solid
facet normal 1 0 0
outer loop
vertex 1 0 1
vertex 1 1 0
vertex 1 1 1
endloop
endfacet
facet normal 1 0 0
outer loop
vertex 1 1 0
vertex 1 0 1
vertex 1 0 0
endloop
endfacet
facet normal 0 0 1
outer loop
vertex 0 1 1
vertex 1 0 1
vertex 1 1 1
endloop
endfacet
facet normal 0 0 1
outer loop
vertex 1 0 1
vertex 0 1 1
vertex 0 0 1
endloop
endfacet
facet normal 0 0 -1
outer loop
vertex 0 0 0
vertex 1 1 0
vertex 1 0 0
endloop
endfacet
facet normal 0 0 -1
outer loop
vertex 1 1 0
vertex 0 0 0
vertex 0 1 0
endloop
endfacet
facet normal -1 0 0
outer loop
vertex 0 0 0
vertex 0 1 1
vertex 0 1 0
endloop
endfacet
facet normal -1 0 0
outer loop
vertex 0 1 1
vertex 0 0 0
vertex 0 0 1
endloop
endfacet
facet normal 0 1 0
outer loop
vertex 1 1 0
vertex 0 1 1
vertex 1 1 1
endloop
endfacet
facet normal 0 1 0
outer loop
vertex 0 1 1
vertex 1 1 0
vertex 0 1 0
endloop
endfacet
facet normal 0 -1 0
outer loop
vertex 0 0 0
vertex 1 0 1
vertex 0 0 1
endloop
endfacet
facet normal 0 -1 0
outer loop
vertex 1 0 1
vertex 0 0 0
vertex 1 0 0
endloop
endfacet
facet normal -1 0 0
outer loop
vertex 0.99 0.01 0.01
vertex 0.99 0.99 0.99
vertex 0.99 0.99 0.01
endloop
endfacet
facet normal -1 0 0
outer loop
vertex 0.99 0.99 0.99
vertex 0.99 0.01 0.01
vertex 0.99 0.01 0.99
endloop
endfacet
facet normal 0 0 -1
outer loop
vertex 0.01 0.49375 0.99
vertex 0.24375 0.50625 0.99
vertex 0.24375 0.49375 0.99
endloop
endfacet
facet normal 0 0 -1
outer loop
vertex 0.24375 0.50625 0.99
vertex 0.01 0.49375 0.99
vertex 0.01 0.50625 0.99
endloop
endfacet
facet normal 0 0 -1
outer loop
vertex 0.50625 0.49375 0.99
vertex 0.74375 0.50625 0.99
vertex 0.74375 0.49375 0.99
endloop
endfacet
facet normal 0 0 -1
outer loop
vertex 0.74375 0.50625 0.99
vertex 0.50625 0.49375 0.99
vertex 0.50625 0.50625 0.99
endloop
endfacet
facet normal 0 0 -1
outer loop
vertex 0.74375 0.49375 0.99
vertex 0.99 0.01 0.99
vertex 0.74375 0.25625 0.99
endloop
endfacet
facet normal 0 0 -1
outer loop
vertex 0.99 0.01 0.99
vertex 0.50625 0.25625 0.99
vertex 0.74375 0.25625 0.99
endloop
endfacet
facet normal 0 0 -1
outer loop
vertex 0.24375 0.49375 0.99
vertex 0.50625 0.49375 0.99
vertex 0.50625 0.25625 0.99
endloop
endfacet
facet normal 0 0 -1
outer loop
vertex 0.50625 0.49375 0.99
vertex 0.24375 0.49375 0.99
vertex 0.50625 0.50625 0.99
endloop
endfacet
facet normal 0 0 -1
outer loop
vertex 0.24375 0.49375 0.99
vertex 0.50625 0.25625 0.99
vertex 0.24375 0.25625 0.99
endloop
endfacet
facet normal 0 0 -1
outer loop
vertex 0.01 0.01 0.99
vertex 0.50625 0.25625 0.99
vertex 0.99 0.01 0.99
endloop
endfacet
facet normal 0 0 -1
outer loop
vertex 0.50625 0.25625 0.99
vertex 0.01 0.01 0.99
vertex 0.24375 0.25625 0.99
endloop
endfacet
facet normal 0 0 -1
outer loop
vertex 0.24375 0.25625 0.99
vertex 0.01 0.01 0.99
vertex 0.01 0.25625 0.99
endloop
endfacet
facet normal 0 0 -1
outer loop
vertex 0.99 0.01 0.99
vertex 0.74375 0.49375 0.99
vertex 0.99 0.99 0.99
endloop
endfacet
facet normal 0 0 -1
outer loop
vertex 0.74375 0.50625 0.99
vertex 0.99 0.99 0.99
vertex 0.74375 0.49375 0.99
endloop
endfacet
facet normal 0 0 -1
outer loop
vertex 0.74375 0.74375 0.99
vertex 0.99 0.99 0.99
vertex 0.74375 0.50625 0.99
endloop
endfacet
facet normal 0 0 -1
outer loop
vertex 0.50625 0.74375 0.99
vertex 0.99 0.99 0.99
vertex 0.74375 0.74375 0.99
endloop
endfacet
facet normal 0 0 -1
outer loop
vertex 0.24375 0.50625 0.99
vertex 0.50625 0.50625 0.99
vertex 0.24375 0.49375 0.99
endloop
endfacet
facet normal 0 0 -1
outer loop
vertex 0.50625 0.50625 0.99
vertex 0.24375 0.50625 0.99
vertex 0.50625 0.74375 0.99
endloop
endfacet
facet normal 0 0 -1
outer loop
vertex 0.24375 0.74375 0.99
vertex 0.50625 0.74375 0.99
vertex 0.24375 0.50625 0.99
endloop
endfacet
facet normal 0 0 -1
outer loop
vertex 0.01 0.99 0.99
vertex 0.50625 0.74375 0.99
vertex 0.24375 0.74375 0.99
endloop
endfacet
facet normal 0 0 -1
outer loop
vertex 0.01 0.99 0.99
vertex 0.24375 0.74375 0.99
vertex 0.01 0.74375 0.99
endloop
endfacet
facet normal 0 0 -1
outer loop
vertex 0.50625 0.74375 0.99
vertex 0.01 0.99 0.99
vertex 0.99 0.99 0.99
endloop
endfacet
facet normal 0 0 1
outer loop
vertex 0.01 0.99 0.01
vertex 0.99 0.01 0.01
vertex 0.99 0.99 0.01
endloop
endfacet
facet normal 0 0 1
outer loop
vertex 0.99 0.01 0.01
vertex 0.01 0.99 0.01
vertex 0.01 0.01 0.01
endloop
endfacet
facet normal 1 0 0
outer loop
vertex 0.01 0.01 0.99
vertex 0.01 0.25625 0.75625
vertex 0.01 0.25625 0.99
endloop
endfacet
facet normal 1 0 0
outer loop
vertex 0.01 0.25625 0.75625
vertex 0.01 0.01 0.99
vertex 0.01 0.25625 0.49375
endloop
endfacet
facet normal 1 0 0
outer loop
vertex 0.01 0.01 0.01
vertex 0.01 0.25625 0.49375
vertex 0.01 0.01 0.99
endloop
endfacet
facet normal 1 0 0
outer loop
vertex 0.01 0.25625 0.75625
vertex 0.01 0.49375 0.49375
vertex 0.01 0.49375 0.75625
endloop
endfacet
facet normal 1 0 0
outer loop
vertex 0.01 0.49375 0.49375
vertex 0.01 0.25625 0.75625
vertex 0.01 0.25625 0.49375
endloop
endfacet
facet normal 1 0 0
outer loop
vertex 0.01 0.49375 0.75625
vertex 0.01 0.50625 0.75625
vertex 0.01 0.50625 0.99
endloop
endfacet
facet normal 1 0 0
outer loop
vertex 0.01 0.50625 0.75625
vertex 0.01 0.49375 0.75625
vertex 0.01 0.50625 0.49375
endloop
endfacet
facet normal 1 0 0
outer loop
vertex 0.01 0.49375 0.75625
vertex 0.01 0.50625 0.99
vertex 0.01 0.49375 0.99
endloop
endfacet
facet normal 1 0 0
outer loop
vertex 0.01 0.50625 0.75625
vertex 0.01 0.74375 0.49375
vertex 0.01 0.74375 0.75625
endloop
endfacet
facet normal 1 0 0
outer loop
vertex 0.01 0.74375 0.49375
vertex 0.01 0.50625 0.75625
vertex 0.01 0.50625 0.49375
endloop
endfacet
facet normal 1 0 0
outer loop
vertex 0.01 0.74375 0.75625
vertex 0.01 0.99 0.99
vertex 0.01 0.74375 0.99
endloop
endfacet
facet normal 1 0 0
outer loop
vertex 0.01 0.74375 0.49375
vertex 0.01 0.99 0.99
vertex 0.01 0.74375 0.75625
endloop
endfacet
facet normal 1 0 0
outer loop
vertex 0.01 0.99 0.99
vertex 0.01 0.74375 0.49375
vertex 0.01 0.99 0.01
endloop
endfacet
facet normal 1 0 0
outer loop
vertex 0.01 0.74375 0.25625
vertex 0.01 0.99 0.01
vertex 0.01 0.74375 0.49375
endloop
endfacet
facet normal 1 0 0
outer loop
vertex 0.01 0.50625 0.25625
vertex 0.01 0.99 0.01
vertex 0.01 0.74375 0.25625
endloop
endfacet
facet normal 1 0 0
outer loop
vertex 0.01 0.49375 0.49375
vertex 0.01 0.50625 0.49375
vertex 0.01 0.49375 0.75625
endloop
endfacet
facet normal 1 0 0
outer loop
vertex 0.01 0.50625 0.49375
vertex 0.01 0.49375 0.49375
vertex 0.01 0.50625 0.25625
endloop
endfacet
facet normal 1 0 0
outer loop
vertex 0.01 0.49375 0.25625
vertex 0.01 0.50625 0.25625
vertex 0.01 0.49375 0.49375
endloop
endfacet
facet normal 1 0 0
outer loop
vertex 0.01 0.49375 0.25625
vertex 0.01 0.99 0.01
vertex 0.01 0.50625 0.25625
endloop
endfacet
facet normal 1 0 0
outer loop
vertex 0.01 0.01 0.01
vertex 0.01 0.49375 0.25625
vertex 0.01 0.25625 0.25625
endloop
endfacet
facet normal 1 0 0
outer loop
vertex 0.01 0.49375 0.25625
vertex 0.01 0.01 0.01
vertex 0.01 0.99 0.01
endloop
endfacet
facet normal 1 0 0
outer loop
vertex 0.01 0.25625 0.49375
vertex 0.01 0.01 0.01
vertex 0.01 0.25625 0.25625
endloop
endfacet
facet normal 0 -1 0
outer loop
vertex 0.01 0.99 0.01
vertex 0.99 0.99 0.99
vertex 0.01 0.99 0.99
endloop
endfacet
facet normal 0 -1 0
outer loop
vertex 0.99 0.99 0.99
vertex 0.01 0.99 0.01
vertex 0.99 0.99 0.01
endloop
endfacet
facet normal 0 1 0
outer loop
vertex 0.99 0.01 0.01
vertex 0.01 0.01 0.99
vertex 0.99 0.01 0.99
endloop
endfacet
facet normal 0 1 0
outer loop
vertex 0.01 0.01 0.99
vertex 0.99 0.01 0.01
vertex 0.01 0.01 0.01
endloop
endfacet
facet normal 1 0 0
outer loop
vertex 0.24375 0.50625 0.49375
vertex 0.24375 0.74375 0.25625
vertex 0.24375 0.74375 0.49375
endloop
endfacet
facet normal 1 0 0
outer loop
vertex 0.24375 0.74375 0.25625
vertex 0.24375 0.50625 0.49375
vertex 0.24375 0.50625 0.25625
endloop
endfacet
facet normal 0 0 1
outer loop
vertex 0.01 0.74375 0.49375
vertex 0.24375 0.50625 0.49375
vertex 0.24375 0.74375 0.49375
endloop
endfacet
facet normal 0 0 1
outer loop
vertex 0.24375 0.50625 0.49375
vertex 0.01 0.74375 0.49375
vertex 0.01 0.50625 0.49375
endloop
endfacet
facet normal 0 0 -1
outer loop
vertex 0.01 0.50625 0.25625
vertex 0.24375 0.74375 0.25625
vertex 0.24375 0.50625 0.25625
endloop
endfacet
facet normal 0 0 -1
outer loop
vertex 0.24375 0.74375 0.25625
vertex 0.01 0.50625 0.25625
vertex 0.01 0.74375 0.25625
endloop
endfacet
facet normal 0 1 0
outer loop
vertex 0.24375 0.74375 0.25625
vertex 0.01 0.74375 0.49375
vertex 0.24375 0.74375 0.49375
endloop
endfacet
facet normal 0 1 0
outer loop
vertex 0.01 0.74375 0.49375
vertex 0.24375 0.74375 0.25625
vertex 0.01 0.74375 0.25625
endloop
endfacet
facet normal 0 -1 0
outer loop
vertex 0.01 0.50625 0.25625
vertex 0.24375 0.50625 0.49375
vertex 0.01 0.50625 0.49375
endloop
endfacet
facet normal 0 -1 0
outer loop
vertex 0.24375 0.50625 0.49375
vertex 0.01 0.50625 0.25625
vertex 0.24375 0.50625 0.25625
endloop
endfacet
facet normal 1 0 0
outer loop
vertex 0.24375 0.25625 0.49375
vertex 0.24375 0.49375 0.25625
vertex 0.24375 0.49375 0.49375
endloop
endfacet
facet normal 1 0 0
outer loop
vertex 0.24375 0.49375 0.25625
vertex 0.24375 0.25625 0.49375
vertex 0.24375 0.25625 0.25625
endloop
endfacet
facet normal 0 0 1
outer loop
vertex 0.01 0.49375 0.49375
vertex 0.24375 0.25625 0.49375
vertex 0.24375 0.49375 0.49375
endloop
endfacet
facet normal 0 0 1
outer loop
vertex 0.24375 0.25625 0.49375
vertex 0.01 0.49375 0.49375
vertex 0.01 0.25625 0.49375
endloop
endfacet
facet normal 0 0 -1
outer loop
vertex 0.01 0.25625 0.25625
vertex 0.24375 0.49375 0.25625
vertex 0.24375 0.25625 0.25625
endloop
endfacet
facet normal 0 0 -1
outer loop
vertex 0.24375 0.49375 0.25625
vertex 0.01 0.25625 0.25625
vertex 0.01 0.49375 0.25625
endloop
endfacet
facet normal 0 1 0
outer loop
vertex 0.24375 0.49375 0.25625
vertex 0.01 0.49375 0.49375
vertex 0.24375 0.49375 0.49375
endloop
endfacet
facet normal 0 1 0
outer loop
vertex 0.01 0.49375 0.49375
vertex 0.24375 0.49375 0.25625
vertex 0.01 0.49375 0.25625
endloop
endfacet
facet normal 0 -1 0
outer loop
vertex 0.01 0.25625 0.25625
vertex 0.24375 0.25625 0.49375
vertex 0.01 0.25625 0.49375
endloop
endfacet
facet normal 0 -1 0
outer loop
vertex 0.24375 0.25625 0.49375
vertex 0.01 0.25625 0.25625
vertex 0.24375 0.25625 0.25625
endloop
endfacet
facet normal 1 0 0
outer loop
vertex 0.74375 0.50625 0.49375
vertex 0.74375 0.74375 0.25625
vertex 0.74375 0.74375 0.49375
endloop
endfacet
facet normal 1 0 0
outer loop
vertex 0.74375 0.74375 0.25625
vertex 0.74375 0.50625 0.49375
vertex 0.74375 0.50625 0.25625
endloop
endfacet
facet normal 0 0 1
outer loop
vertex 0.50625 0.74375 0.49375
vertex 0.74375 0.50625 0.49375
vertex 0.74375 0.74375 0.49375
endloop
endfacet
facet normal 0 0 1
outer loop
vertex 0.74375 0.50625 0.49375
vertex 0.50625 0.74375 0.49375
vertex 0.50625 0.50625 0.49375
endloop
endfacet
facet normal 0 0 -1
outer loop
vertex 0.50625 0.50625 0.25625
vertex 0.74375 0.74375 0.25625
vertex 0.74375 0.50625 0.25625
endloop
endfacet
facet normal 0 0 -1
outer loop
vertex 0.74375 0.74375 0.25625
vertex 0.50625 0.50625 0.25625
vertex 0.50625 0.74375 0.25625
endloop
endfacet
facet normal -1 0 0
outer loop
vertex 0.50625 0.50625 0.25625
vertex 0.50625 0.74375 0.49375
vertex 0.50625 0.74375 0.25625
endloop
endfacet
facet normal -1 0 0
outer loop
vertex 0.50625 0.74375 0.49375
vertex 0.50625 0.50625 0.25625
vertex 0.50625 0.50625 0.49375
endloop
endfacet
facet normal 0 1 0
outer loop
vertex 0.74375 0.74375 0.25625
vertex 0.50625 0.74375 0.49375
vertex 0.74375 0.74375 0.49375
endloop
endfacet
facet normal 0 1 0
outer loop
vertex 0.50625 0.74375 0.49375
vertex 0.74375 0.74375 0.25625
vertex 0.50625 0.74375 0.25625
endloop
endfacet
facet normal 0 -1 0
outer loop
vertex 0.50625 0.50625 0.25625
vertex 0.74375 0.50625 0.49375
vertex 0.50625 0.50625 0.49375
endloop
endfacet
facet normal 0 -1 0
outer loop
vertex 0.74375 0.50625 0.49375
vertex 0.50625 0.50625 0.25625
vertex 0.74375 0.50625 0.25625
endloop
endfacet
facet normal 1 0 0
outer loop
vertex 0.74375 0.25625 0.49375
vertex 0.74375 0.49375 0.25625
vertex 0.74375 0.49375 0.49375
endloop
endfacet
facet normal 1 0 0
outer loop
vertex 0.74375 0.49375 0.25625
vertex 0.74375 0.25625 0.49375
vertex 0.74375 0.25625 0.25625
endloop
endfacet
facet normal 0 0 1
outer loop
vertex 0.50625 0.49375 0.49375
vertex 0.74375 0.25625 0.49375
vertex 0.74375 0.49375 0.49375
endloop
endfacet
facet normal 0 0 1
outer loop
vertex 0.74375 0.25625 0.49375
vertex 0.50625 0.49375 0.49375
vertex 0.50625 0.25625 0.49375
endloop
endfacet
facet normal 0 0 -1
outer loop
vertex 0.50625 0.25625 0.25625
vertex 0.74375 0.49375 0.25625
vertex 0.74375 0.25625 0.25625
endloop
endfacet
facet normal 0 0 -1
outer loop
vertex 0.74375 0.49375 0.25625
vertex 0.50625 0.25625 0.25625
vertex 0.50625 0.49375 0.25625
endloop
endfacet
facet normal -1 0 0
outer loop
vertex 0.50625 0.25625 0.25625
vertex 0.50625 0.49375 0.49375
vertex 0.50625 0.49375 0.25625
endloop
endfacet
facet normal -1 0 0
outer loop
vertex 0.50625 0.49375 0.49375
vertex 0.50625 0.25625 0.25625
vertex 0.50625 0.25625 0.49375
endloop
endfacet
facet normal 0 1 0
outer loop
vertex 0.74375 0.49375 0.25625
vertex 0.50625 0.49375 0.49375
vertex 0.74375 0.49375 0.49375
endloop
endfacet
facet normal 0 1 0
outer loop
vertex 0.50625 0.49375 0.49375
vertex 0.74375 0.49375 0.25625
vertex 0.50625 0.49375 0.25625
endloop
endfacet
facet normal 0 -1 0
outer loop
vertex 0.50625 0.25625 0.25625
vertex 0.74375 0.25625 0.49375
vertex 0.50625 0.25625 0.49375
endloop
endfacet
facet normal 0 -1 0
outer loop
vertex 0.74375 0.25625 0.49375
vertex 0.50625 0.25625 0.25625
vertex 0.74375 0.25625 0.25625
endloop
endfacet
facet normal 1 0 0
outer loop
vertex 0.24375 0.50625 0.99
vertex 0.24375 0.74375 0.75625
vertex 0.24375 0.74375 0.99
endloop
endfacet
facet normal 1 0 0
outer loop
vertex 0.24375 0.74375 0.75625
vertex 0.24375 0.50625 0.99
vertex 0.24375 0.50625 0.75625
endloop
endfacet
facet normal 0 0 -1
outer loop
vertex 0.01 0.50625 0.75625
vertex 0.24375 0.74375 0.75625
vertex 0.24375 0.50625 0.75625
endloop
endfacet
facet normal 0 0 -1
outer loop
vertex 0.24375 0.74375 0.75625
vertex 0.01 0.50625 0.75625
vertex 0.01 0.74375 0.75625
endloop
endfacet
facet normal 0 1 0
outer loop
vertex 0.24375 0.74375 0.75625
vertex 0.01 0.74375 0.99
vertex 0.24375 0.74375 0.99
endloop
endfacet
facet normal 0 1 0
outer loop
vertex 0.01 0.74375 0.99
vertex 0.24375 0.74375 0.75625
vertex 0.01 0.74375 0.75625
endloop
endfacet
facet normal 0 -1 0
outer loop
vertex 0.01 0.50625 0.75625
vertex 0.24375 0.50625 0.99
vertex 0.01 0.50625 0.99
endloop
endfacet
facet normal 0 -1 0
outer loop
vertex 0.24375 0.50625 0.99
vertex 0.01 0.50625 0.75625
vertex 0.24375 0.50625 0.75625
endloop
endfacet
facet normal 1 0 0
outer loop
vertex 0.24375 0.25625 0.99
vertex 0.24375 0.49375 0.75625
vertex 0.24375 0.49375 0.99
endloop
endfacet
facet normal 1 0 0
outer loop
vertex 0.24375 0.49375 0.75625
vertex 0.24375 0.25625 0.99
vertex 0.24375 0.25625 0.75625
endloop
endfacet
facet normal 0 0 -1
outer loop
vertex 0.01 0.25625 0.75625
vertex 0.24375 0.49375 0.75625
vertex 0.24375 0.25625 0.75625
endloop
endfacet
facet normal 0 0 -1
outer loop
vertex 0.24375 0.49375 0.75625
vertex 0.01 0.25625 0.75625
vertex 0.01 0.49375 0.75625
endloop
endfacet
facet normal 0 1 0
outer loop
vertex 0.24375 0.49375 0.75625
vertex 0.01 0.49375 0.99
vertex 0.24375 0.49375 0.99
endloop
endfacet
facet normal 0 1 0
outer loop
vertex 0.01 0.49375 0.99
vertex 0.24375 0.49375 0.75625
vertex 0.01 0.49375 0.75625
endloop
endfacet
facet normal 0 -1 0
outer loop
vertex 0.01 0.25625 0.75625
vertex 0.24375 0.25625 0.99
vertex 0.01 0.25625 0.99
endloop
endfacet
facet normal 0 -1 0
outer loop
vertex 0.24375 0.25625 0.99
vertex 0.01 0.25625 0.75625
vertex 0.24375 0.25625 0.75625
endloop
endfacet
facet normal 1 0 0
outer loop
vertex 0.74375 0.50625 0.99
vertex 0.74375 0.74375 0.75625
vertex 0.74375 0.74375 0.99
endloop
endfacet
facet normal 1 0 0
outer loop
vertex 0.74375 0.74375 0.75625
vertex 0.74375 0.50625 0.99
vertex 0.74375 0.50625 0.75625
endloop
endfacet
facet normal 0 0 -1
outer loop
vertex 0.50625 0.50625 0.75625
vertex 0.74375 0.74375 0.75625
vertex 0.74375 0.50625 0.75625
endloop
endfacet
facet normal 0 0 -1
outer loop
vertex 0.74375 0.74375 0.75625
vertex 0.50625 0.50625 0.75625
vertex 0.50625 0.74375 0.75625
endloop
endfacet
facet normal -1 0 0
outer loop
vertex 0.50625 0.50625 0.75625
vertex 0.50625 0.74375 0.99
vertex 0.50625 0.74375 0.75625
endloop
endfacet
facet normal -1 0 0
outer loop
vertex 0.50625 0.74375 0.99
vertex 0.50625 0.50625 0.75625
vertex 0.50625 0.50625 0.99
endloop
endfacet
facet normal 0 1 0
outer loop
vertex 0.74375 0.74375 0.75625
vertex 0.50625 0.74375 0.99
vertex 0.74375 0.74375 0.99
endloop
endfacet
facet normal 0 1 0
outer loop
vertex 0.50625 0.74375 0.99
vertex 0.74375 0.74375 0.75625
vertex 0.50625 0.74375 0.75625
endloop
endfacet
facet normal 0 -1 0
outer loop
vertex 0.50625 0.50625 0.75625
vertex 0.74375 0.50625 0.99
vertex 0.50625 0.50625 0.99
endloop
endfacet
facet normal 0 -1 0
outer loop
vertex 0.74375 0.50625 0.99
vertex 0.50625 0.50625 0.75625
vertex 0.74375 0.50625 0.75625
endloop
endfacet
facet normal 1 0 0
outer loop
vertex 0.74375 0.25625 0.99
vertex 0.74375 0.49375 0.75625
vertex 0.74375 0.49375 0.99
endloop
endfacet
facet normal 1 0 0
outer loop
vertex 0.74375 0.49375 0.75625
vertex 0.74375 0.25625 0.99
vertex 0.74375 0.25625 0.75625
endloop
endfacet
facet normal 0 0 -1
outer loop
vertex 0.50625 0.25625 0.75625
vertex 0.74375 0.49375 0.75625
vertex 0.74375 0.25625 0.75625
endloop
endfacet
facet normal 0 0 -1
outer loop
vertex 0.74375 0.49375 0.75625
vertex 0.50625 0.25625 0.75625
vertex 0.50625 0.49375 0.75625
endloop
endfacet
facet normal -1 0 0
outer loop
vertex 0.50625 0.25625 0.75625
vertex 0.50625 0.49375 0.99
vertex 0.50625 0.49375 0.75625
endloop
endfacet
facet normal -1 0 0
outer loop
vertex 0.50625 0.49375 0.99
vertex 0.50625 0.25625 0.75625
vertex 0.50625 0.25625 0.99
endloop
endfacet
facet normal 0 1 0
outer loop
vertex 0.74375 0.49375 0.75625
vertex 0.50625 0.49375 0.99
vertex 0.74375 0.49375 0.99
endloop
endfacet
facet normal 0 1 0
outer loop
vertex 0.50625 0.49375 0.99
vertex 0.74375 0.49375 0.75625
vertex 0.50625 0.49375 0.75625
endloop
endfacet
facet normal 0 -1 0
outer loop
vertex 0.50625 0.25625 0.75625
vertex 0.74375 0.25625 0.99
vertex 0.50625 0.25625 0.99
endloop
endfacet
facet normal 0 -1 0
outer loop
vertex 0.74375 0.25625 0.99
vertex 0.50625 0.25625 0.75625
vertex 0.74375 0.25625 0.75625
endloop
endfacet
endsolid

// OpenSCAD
translate([0.125, 0.625, 0.375]) color([0.3760240270691989, 0.9300483819954969, 0.5339128268680314]) cube([0.2375, 0.2375, 0.2375], center=true);
translate([0.125, 0.375, 0.375]) color([0.1447926131068097, 0.5077146159165203, 0.8566686085098966]) cube([0.2375, 0.2375, 0.2375], center=true);
translate([0.625, 0.625, 0.375]) color([0.9071142384229682, 0.9853245821032424, 0.56602023549897]) cube([0.2375, 0.2375, 0.2375], center=true);
translate([0.625, 0.375, 0.375]) color([0.8682414680053074, 0.6461443756157764, 0.5204197141817516]) cube([0.2375, 0.2375, 0.2375], center=true);
translate([0.125, 0.625, 0.875]) color([0.8168814859372707, 0.28665311841273977, 0.6342437204210895]) cube([0.2375, 0.2375, 0.2375], center=true);
translate([0.125, 0.375, 0.875]) color([0.9304924006833106, 0.893959029930078, 0.6310524133075117]) cube([0.2375, 0.2375, 0.2375], center=true);
translate([0.625, 0.625, 0.875]) color([0.407012465337695, 0.17909127290647575, 0.6963308781189025]) cube([0.2375, 0.2375, 0.2375], center=true);
translate([0.625, 0.375, 0.875]) color([0.0237115014859528, 0.0369819674897941, 0.7051799931376899]) cube([0.2375, 0.2375, 0.2375], center=true);
color([0.3,0.3,0.3,0.3]) difference() { cube([1,1,1]); translate([0.01,0.01,0.01]) cube([0.98,0.98,0.98]); }
